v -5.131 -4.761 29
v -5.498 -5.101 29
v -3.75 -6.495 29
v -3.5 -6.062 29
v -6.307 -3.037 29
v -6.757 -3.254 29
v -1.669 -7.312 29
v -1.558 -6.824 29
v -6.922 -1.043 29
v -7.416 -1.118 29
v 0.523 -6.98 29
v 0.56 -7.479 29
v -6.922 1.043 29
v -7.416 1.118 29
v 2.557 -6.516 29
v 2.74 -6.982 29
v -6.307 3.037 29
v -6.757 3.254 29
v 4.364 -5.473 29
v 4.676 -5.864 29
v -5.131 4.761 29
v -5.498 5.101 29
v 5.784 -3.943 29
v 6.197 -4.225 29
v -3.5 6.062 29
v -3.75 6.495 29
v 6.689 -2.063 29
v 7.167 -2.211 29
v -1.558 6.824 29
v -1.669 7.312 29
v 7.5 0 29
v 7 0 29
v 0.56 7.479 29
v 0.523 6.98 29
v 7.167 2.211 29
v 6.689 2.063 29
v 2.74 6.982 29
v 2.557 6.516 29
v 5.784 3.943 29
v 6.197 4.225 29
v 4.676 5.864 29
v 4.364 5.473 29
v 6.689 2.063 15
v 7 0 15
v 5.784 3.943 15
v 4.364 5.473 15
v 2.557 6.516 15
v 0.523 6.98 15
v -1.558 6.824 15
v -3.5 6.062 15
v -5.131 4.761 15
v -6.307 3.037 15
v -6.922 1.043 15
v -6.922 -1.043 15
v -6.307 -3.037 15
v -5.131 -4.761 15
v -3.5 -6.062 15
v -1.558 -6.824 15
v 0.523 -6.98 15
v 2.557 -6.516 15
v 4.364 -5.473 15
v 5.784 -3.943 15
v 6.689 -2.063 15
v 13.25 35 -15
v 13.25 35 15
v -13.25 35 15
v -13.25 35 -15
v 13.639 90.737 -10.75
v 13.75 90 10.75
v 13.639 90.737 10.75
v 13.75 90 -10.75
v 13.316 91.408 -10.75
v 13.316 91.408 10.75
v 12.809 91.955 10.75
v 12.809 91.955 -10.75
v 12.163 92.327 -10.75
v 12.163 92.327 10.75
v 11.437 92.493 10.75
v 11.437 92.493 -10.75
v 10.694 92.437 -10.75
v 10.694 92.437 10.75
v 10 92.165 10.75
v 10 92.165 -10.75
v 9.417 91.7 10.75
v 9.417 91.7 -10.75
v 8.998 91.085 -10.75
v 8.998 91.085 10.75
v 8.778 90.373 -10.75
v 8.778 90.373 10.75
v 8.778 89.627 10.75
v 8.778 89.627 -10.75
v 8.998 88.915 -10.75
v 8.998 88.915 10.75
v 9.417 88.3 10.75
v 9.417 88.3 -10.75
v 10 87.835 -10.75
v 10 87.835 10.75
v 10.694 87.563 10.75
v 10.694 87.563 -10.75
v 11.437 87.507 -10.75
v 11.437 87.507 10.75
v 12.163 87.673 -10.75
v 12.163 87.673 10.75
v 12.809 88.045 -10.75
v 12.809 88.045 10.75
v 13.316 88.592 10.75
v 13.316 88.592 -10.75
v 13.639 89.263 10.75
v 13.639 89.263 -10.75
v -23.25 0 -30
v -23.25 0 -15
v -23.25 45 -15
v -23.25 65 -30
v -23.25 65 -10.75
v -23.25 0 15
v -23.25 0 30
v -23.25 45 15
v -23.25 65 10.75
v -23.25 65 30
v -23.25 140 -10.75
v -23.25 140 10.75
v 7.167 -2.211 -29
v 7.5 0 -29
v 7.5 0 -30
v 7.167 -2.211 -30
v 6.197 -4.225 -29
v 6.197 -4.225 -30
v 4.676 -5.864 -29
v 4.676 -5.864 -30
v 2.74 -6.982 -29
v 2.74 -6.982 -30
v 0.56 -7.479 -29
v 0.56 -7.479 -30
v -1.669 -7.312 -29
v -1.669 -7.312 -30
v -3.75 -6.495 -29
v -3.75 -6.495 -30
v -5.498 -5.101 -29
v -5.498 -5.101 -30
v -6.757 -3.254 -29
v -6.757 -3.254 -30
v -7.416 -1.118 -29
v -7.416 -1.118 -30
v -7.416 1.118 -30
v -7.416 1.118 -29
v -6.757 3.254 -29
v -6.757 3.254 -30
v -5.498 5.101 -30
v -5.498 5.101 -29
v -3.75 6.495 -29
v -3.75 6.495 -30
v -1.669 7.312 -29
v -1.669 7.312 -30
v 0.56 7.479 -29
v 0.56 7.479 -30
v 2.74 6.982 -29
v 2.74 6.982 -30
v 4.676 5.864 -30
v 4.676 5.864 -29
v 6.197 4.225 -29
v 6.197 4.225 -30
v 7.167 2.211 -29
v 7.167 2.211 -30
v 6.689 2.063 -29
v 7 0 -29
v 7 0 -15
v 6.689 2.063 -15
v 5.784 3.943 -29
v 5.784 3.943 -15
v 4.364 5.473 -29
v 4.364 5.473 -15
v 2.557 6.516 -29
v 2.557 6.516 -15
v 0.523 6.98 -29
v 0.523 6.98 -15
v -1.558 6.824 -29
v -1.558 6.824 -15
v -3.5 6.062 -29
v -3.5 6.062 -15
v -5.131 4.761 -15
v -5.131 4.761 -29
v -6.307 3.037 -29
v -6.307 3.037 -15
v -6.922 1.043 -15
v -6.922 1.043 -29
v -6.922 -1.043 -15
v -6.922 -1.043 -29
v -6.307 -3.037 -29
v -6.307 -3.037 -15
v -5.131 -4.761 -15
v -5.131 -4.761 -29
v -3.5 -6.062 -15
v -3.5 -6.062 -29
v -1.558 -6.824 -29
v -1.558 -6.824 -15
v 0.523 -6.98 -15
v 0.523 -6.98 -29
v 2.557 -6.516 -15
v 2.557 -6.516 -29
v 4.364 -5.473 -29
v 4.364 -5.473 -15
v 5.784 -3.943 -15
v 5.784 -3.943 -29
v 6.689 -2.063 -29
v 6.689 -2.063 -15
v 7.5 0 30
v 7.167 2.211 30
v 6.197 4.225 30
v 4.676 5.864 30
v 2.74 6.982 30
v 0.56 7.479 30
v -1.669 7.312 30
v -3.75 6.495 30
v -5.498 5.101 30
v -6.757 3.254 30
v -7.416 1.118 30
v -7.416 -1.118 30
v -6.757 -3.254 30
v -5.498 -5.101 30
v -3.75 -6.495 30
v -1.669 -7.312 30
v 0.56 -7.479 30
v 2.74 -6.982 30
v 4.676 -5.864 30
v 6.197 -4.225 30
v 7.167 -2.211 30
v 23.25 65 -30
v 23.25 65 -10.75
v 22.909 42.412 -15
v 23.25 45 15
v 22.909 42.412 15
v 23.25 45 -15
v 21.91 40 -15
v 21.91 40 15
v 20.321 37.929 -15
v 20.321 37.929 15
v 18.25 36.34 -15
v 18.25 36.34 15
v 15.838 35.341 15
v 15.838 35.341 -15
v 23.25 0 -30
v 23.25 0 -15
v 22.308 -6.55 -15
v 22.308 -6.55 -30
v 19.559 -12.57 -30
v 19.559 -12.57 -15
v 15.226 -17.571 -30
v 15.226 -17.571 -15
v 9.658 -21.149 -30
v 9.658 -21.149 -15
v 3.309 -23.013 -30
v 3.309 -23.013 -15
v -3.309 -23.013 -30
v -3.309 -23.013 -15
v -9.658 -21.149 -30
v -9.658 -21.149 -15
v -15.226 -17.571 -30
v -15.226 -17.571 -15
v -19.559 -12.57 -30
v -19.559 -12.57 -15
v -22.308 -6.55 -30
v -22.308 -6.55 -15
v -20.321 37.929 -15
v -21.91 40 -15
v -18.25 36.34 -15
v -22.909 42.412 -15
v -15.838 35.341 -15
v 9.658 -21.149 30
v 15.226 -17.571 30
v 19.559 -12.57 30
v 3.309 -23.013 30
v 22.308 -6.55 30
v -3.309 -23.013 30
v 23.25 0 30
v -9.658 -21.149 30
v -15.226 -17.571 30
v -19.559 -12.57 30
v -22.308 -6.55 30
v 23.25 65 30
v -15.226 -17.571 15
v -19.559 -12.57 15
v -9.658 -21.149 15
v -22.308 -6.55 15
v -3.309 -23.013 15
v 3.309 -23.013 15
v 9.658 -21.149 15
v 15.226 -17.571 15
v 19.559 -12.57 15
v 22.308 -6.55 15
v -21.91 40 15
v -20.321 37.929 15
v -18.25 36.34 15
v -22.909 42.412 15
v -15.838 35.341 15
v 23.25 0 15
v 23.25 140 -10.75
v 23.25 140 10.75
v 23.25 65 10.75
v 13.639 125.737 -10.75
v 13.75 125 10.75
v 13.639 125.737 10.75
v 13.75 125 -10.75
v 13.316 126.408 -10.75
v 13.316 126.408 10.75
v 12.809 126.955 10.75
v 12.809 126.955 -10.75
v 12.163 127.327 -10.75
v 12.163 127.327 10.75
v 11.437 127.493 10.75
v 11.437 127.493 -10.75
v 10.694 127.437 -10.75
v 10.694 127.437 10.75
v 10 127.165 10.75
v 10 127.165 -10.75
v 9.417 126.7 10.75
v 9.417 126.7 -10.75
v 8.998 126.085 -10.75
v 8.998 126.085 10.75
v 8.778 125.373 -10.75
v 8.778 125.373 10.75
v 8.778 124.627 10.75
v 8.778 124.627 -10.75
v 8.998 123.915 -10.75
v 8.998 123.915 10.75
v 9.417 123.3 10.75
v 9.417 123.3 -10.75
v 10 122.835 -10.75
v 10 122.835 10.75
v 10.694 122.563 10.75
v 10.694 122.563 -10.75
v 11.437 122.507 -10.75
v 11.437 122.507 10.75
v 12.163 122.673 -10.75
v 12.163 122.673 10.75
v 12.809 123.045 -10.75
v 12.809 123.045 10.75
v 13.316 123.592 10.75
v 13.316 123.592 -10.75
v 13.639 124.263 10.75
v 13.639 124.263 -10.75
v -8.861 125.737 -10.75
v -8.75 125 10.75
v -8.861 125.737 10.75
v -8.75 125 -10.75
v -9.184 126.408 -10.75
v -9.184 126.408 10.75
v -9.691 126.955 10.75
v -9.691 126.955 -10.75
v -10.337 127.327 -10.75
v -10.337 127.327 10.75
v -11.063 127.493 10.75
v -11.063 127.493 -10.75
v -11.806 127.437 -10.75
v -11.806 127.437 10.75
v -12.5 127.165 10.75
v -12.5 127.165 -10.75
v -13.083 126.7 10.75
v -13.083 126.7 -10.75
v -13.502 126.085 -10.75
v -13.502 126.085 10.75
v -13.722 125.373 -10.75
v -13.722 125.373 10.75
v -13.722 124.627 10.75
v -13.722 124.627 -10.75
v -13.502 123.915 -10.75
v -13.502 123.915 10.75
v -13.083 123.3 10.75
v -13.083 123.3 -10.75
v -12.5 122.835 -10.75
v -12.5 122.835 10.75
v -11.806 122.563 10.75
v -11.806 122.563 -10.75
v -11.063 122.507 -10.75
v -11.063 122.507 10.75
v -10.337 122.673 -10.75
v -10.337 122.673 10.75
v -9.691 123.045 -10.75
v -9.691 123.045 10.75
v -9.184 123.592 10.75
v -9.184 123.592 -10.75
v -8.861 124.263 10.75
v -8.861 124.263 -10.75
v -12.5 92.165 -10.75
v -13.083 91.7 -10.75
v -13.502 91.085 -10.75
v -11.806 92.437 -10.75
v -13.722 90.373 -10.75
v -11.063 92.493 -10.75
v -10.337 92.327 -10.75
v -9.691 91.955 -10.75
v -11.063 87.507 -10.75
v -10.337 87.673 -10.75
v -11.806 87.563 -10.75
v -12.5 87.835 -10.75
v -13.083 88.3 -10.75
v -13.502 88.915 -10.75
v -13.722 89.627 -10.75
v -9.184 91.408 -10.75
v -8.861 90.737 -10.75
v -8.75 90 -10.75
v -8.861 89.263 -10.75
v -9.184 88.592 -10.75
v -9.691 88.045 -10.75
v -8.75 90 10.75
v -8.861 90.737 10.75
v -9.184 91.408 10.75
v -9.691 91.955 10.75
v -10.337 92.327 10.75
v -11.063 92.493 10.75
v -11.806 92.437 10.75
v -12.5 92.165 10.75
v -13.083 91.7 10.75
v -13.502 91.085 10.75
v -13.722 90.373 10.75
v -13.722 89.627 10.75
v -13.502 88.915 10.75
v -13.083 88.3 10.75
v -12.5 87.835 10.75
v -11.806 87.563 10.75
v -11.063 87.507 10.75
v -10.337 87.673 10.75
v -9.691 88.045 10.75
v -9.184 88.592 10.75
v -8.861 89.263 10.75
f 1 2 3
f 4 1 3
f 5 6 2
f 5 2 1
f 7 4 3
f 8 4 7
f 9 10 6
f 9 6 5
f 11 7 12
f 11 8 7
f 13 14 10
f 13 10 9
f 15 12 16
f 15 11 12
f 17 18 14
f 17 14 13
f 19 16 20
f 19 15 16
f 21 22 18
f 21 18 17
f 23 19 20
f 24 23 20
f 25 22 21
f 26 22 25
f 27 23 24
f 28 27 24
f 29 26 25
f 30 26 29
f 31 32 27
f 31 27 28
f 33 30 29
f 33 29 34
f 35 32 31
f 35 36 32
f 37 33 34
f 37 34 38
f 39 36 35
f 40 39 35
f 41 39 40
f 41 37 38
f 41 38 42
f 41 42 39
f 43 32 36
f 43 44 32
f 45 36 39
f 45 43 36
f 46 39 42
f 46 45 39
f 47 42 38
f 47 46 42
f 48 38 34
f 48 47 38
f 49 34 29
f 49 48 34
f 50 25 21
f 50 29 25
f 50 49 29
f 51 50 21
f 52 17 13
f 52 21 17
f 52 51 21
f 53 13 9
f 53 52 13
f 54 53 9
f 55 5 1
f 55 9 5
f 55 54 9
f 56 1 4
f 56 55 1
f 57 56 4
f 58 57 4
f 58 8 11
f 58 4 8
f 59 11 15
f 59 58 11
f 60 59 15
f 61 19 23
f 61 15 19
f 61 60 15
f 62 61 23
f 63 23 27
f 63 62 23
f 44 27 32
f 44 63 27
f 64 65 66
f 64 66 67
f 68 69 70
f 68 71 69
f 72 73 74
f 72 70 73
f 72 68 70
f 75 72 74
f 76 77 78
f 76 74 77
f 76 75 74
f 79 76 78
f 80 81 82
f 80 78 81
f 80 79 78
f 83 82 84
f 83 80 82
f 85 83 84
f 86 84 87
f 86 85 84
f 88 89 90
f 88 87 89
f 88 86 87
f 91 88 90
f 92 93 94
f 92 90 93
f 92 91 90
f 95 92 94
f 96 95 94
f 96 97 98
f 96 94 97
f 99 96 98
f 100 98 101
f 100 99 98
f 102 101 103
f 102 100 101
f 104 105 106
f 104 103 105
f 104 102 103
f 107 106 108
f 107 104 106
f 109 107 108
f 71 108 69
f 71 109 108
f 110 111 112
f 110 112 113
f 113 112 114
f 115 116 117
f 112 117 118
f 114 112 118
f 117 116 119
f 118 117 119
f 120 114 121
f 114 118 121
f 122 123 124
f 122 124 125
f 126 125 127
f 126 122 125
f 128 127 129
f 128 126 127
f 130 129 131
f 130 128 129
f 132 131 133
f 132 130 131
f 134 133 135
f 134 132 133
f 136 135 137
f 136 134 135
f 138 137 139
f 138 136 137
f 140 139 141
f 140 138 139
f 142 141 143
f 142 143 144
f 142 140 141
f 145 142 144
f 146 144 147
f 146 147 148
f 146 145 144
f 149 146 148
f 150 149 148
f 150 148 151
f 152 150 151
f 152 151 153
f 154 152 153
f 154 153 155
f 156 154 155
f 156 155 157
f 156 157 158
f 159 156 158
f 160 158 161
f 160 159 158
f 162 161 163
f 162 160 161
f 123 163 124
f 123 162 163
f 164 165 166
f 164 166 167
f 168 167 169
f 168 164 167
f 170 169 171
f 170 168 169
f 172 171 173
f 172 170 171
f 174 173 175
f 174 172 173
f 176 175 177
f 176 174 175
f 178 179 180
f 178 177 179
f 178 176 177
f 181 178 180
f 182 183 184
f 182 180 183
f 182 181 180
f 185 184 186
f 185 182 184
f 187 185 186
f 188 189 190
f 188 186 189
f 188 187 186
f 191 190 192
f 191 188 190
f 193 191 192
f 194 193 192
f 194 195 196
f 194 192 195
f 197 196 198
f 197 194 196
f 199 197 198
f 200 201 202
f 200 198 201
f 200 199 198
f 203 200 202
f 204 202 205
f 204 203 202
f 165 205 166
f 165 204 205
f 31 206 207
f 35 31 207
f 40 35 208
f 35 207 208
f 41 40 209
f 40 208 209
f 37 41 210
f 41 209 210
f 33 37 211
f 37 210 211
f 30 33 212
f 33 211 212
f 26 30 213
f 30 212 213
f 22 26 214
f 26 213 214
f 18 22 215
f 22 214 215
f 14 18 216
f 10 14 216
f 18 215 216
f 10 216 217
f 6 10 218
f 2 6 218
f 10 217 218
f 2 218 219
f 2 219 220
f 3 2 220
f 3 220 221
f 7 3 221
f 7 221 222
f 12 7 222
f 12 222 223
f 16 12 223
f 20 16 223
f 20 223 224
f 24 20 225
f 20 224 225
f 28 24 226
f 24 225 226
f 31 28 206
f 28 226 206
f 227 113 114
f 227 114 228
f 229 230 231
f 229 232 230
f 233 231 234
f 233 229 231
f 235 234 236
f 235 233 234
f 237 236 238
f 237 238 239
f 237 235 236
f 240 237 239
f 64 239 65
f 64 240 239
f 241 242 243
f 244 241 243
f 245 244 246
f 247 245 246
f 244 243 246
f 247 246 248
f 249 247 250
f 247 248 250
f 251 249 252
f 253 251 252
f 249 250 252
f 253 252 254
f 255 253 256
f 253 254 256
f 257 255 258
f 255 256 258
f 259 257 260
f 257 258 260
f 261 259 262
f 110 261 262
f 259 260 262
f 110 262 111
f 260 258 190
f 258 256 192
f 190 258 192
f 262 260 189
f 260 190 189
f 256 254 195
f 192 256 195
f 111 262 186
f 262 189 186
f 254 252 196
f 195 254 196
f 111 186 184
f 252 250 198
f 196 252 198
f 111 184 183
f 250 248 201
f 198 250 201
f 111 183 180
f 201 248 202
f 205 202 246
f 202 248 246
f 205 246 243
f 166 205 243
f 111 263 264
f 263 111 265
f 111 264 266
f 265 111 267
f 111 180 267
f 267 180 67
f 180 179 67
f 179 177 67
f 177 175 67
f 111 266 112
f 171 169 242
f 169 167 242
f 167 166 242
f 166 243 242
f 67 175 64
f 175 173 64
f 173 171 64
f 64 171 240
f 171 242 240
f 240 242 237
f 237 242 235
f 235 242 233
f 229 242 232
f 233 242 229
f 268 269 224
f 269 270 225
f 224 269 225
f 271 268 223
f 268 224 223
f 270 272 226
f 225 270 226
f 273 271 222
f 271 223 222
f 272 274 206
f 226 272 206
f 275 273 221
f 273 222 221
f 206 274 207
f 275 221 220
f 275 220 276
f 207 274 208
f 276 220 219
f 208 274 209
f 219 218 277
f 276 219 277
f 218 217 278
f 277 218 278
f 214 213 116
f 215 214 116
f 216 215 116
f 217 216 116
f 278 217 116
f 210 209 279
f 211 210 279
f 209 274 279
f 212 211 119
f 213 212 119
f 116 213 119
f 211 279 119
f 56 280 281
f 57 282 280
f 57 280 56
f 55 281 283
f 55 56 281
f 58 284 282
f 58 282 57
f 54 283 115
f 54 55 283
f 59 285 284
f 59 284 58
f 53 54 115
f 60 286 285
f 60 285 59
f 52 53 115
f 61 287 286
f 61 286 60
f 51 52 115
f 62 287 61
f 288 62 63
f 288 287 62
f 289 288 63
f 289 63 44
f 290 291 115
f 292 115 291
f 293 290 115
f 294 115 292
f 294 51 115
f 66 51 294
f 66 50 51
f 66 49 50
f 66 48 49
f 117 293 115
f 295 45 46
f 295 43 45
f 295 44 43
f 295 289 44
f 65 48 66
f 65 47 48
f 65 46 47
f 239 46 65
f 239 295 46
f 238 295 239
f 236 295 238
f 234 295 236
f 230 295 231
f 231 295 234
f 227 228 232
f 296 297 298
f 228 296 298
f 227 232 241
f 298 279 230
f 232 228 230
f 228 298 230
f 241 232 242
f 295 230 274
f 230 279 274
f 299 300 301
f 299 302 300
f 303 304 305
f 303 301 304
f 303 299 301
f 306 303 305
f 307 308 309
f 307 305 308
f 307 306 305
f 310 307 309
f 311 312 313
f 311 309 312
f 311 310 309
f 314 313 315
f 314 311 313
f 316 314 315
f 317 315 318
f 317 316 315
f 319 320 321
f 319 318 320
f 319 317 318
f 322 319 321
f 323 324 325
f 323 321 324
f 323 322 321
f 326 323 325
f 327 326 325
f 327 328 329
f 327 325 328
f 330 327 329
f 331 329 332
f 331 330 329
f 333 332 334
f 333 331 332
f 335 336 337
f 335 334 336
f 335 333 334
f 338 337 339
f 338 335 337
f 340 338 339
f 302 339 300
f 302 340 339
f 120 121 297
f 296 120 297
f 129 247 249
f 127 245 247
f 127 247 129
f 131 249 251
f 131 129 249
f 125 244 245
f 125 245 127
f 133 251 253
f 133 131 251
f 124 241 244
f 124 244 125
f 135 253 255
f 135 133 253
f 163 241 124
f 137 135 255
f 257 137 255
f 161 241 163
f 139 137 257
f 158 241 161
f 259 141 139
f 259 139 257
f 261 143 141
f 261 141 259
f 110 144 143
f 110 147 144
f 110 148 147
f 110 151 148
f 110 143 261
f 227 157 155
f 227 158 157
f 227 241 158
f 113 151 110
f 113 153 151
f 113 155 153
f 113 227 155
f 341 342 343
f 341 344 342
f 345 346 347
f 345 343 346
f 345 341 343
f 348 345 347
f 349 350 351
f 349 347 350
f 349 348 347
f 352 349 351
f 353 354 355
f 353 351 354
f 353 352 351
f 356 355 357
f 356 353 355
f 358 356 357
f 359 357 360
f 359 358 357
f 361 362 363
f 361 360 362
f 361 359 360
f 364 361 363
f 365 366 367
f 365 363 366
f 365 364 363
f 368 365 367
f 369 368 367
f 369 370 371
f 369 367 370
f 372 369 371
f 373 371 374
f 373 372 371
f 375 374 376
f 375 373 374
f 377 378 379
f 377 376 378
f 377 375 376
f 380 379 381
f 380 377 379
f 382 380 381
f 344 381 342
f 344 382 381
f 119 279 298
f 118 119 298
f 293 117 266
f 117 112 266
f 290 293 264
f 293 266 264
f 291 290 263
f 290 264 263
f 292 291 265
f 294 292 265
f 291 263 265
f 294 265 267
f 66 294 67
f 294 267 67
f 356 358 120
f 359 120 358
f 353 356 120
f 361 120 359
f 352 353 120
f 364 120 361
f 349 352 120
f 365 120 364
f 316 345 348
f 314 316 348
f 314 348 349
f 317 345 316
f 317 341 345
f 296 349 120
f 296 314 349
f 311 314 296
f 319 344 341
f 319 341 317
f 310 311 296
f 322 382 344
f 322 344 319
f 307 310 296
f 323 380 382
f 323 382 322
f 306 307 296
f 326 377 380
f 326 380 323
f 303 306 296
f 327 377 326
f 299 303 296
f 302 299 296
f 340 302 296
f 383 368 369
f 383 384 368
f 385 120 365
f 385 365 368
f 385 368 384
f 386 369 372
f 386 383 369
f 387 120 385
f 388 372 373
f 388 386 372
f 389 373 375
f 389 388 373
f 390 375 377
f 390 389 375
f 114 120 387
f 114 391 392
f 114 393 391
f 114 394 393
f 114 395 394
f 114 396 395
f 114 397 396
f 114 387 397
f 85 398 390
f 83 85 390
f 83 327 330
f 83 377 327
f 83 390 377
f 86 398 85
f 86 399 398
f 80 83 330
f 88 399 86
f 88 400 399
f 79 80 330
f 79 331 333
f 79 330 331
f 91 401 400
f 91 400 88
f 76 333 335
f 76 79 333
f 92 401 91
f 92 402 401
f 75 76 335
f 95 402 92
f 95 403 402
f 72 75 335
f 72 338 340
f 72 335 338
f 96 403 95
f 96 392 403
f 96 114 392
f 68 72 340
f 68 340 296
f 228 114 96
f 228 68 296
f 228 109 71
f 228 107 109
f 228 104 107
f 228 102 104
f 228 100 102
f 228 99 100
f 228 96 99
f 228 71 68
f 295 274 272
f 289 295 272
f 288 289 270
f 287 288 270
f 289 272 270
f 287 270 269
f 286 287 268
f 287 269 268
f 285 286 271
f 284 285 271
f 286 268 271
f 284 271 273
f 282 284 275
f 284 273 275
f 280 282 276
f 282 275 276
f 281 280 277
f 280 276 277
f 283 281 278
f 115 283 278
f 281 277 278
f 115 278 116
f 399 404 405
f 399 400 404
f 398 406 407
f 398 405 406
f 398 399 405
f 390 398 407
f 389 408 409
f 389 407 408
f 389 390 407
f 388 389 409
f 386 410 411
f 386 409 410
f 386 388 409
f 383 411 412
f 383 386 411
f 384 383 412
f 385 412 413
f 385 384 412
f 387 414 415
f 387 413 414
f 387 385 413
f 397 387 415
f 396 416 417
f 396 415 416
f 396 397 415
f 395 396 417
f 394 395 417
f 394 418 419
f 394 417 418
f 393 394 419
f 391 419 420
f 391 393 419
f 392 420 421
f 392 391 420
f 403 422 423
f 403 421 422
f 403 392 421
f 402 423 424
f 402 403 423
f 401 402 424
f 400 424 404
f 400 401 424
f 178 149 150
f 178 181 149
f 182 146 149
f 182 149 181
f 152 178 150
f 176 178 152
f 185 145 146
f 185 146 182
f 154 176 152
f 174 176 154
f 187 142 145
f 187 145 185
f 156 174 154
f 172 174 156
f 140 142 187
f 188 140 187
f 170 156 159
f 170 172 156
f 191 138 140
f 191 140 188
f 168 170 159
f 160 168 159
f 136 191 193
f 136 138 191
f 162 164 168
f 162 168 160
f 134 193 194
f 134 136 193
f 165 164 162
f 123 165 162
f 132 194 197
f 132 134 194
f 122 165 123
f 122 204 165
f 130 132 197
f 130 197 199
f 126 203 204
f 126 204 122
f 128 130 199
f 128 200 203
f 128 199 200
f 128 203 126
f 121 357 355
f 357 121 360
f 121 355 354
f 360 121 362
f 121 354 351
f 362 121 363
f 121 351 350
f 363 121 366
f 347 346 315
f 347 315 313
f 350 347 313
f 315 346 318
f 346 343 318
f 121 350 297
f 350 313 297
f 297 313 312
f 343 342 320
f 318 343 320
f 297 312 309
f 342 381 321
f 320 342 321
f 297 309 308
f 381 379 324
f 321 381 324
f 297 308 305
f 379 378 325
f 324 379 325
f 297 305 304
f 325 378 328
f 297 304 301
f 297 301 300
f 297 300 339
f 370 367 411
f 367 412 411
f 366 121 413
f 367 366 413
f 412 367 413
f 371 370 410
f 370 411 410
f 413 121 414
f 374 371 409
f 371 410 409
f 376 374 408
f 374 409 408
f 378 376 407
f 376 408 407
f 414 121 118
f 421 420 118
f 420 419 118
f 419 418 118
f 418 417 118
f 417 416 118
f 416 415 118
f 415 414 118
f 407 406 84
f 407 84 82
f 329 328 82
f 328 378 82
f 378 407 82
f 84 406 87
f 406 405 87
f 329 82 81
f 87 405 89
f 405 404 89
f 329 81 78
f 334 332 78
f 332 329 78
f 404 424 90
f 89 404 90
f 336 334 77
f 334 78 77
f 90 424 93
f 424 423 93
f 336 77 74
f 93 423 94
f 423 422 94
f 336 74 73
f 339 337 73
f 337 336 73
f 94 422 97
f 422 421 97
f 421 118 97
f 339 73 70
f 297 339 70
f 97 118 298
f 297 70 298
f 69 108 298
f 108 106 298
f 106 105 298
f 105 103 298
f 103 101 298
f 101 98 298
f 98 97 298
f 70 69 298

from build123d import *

# Parameters (mm, degrees)
SKETCH1_R           = 7
SKETCH1_R_2         = 2.5
BOSS_EXTRUDE1_DEPTH = 30
SKETCH2_W           = 30
SKETCH2_H           = 58.25
CUT_EXTRUDE1_DEPTH  = 151.539861831
SKETCH3_R           = 7.5
CUT_EXTRUDE2_DEPTH  = 1
CUT_EXTRUDE3_START  = -1
SKETCH4_R           = 7.5
CUT_EXTRUDE3_DEPTH  = 1
SKETCH6_W           = 17.3
SKETCH6_H           = 75
CUT_EXTRUDE4_DEPTH  = 151.539861831
SKETCH7_W           = 46.5
SKETCH7_H           = 1.95
CUT_EXTRUDE5_DEPTH  = 97.065732704
FILLET1_R           = 10


with BuildPart() as part:
    # Sketch1 → Boss-Extrude1 (new, symmetric)
    with BuildSketch(Plane.XY):
        with BuildLine():
            Line((-23.25, 0), (-23.25, 140))
            Line((-23.25, 140), (23.25, 140))
            Line((23.25, 140), (23.25, 0))
            ThreePointArc((23.25, 0), (0, -23.25), (-23.25, 0))
        make_face()
        Circle(SKETCH1_R, mode=Mode.SUBTRACT)
        with Locations((-11.25, 125)):
            Circle(SKETCH1_R_2, mode=Mode.SUBTRACT)
        with Locations((11.25, 125)):
            Circle(SKETCH1_R_2, mode=Mode.SUBTRACT)
        with Locations((11.25, 90)):
            Circle(SKETCH1_R_2, mode=Mode.SUBTRACT)
        with Locations((-11.25, 90)):
            Circle(SKETCH1_R_2, mode=Mode.SUBTRACT)
    extrude(amount=BOSS_EXTRUDE1_DEPTH, both=True)

    # Sketch2 → Cut-Extrude1 (cut, through all)
    with BuildSketch(Plane(origin=(23.25, 0, 0), x_dir=(0, 0, -1), z_dir=(1, 0, 0))):
        with Locations((0, 5.875)):
            Rectangle(SKETCH2_W, SKETCH2_H)
    extrude(amount=-CUT_EXTRUDE1_DEPTH, mode=Mode.SUBTRACT)

    # Sketch3 → Cut-Extrude2 (cut)
    with BuildSketch(Plane.XY.offset(30)):
        Circle(SKETCH3_R)
    extrude(amount=-CUT_EXTRUDE2_DEPTH, mode=Mode.SUBTRACT)

    # Sketch4 → Cut-Extrude3 (cut)
    with BuildSketch(Plane(origin=(0, 0, -30), x_dir=(-1, 0, 0), z_dir=(0, 0, -1)).offset(CUT_EXTRUDE3_START)):
        with Locations(Location((0, 0, 0), (0, 0, 180))):
            Circle(SKETCH4_R)
    extrude(amount=CUT_EXTRUDE3_DEPTH, mode=Mode.SUBTRACT)

    # Sketch6 → Cut-Extrude4 (cut, through all)
    with BuildSketch(Plane(origin=(23.25, 0, 0), x_dir=(0, 0, -1), z_dir=(1, 0, 0))):
        with Locations((-21.35, 102.5)):
            Rectangle(SKETCH6_W, SKETCH6_H)
        with Locations((21.35, 102.5)):
            Rectangle(SKETCH6_W, SKETCH6_H)
    extrude(amount=-CUT_EXTRUDE4_DEPTH, mode=Mode.SUBTRACT)

    # Sketch7 → Cut-Extrude5 (cut, through all)
    with BuildSketch(Plane(origin=(0, 65, 0), x_dir=(1, 0, 0), z_dir=(0, 1, 0))):
        with Locations((0, 11.725)):
            Rectangle(SKETCH7_W, SKETCH7_H)
        with Locations((0, -11.725)):
            Rectangle(SKETCH7_W, SKETCH7_H)
    extrude(amount=CUT_EXTRUDE5_DEPTH, mode=Mode.SUBTRACT)

    # Fillet1
    fillet1_edges = [part.edges().sort_by_distance(p)[0] for p in [
        (23.25, 35, 0),
        (-23.25, 35, 0),
    ]]
    fillet(fillet1_edges, radius=FILLET1_R)


solid = part.part
